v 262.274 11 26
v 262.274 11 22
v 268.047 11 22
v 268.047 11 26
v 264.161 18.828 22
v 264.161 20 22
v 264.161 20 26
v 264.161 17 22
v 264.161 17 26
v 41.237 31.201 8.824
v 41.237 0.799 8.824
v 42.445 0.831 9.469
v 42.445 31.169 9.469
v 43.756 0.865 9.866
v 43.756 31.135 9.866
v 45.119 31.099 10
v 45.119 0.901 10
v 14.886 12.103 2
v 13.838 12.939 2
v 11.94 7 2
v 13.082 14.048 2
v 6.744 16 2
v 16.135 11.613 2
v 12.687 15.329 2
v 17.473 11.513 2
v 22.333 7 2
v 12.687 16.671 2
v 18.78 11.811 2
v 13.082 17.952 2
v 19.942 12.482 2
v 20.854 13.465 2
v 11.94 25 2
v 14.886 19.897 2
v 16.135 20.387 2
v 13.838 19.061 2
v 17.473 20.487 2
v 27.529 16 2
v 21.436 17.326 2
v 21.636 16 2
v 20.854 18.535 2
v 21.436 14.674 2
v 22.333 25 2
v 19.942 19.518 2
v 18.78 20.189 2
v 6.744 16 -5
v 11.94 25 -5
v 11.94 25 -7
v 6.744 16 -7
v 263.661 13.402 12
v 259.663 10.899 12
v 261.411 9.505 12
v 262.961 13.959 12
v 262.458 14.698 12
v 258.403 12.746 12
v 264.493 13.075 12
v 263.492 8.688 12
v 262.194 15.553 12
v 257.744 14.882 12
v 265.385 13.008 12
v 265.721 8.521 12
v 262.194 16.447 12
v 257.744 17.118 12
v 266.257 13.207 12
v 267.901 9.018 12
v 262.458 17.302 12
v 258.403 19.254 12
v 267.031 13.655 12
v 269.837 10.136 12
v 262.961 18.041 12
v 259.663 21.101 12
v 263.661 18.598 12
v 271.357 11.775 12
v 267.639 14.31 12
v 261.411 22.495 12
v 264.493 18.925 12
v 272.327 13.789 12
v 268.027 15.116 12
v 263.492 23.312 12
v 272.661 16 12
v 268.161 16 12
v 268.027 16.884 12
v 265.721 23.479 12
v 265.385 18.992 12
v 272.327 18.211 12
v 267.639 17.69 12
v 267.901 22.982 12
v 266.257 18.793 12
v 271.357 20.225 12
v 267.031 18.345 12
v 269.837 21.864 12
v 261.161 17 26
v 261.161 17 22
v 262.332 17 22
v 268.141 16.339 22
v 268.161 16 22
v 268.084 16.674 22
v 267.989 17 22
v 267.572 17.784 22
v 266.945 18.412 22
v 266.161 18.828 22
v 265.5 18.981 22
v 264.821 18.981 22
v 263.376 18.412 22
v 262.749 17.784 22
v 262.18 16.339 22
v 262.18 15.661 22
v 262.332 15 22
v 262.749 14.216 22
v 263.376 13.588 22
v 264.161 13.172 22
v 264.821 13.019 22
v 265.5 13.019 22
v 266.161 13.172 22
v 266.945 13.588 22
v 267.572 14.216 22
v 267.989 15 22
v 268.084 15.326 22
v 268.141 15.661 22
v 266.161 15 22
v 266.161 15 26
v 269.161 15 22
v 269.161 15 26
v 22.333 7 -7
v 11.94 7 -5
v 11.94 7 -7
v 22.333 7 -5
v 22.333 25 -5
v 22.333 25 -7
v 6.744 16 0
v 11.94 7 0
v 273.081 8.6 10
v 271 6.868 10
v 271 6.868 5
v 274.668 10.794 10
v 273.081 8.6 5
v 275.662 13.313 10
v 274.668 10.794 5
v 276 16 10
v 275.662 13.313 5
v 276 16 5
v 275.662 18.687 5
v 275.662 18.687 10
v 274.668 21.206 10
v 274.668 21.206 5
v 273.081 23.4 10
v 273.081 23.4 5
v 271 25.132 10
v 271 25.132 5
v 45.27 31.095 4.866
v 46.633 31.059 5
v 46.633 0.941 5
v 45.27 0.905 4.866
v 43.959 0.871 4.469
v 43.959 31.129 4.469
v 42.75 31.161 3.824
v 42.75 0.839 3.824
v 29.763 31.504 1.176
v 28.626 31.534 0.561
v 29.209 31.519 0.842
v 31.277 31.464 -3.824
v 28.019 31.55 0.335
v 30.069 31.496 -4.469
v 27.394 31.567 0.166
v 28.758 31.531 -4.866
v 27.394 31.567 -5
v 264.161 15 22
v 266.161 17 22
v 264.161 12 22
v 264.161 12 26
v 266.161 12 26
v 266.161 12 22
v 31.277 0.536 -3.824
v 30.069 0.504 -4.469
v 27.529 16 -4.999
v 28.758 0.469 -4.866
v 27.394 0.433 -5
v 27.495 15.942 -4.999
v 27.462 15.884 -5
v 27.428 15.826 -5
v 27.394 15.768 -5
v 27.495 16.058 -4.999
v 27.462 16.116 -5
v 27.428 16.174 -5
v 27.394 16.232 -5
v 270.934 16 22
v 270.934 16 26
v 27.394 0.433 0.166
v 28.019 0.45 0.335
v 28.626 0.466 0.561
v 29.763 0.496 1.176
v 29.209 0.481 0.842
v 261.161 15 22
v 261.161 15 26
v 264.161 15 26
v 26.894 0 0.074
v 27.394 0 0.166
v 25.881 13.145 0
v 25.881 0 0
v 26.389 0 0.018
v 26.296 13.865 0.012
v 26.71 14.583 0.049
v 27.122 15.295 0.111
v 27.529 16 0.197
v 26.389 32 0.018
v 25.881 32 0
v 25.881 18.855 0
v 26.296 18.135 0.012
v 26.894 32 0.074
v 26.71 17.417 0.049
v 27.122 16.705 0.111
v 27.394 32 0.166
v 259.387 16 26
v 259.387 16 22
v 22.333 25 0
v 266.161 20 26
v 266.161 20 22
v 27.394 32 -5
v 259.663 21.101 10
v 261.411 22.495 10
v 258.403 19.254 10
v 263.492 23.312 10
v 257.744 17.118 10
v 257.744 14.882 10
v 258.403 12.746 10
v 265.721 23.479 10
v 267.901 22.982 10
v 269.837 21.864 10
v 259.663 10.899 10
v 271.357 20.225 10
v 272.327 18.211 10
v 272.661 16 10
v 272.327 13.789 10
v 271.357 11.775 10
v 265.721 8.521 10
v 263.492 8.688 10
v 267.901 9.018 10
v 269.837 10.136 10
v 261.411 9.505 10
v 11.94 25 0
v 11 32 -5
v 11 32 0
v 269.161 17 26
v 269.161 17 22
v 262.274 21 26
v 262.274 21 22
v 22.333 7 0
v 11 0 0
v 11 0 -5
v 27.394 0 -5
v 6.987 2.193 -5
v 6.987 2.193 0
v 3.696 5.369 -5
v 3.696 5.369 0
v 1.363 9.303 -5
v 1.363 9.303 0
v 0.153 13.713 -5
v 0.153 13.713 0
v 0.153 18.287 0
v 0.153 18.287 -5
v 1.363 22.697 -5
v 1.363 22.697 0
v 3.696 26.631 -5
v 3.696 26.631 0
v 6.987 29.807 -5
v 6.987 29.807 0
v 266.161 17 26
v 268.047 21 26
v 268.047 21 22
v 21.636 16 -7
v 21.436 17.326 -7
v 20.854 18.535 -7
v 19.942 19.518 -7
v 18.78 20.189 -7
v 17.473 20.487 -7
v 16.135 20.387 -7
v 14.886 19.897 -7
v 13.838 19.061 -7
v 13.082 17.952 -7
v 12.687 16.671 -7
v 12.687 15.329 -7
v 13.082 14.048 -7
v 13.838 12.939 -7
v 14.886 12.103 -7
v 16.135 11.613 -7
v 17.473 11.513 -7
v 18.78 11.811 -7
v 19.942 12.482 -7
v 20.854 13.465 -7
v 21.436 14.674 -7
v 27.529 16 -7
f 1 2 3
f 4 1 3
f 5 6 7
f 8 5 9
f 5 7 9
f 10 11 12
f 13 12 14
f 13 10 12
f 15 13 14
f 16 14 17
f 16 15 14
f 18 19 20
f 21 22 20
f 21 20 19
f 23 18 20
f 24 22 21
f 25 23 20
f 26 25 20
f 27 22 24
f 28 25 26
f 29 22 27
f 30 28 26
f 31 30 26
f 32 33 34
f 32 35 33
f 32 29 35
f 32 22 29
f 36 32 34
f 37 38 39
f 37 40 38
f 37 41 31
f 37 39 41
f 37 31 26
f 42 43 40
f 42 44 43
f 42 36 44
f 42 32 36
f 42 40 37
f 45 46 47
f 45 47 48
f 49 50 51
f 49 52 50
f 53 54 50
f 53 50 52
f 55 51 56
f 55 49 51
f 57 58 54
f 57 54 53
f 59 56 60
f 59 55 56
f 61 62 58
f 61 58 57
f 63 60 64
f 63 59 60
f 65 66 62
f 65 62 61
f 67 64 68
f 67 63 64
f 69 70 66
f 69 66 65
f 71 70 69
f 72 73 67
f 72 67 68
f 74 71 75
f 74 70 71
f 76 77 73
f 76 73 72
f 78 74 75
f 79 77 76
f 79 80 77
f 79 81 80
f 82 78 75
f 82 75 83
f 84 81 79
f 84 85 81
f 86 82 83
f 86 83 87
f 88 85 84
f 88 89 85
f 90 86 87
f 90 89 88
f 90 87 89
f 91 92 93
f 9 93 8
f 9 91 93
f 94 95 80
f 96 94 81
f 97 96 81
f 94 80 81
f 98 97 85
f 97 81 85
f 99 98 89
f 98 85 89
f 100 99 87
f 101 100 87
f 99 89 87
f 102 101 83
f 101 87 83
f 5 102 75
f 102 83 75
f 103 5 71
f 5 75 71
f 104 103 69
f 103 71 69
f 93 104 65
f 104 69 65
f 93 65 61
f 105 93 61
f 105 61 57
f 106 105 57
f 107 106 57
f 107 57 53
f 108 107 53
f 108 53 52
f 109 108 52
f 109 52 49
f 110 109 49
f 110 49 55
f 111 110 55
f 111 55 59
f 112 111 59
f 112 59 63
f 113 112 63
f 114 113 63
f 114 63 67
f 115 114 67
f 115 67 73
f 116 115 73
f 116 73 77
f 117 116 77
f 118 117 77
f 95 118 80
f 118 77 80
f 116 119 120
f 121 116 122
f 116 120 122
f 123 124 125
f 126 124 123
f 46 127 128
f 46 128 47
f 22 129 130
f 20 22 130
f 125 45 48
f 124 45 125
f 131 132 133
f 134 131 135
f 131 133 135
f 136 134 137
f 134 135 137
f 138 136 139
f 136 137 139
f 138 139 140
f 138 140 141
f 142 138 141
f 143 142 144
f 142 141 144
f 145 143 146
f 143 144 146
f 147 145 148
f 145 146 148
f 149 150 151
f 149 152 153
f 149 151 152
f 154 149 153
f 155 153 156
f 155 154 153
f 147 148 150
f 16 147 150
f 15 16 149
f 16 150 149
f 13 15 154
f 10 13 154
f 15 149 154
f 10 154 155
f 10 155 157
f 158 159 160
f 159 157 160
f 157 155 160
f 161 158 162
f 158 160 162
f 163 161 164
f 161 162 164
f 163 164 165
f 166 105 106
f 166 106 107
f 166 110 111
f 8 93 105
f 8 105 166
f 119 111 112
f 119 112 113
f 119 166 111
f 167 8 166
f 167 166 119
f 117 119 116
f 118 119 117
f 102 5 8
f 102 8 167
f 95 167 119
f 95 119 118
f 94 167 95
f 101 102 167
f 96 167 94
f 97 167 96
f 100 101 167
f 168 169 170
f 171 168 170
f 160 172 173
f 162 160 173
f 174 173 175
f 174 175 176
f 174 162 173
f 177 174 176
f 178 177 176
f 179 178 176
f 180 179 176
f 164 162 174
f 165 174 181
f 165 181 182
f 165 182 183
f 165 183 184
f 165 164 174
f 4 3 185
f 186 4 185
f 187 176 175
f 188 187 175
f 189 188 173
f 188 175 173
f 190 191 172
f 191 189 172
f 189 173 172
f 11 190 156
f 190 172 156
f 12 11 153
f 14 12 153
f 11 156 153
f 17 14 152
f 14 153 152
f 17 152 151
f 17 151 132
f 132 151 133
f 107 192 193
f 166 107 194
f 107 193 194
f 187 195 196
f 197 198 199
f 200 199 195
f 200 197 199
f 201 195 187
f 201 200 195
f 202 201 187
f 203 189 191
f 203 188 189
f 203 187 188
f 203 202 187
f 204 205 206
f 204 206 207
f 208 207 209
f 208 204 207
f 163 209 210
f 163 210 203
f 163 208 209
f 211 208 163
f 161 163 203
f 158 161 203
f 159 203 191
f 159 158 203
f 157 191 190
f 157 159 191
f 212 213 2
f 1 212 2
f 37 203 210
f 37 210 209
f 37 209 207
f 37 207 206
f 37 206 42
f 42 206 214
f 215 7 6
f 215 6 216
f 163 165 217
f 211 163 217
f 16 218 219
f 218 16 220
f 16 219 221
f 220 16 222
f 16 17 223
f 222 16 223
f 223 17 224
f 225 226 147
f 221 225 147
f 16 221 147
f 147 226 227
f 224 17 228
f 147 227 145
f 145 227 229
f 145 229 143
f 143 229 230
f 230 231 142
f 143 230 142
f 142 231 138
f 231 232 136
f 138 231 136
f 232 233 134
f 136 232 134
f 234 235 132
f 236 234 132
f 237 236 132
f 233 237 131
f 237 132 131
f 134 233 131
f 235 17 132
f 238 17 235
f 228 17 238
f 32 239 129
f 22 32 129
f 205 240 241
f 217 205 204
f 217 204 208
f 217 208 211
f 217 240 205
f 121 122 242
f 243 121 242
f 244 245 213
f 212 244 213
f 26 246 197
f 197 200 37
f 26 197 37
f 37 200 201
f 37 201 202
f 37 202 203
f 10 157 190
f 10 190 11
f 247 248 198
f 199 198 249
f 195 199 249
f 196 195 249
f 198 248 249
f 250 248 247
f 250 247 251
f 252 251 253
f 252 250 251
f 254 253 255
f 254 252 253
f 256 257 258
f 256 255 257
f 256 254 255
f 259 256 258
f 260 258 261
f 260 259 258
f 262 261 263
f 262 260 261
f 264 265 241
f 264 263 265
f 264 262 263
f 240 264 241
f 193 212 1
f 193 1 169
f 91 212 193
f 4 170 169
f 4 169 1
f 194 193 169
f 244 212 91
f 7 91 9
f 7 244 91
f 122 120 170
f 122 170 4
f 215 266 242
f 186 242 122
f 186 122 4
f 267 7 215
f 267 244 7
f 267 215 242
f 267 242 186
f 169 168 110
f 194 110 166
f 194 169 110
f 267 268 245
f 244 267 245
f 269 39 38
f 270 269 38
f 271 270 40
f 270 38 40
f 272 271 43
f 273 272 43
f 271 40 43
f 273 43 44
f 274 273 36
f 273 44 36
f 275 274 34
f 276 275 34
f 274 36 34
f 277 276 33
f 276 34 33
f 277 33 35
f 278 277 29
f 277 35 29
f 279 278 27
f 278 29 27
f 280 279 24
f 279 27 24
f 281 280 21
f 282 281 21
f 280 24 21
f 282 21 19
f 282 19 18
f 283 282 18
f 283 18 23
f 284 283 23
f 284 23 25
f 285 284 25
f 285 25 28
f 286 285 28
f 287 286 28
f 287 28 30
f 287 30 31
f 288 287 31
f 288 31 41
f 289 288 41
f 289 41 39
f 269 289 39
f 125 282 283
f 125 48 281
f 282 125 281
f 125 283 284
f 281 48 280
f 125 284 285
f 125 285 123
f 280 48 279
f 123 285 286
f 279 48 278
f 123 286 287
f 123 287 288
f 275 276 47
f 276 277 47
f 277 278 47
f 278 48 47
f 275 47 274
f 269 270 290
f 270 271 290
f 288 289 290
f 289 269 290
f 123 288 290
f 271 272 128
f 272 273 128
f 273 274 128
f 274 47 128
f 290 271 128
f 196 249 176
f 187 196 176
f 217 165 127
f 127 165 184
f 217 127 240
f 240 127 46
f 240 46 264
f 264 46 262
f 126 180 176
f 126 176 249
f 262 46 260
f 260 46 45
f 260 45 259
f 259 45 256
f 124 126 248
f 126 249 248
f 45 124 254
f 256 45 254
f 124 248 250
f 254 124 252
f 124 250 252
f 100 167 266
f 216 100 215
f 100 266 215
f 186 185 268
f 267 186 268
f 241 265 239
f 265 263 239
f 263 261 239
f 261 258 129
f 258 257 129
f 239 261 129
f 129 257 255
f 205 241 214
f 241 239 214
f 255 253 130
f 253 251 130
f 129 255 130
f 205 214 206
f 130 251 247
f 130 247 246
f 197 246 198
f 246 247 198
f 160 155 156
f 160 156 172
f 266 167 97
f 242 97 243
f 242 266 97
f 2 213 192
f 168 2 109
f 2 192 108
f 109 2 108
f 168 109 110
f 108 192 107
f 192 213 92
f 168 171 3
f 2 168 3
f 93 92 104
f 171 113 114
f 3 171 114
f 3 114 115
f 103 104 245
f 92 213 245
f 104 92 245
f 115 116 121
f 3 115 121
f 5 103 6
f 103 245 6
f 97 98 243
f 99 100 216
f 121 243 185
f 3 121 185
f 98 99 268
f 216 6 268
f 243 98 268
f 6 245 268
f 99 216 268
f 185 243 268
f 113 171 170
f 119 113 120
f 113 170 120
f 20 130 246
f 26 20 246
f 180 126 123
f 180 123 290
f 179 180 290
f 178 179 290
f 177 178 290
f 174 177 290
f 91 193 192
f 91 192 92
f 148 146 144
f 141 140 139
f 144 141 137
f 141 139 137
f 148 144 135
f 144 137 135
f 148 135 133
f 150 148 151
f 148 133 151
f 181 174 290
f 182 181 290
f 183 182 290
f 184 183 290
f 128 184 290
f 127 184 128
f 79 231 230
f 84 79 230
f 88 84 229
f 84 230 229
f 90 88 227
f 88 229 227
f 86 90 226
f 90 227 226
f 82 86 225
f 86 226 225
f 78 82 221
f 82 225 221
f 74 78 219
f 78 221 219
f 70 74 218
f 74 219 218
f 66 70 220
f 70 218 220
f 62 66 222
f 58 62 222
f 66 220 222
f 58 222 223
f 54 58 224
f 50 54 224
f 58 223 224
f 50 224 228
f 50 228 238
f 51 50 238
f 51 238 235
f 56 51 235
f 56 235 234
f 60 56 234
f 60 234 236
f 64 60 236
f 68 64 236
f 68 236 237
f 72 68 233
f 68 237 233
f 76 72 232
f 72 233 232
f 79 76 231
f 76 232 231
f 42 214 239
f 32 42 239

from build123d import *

# Parameters (mm, degrees)
BOSS_EXTRUDE1_DEPTH = 32
FILLET1_R           = 7
CUT_EXTRUDE1_DEPTH  = 32
CUT_EXTRUDE2_DEPTH  = 32
CUT_EXTRUDE3_DEPTH  = 32
SKETCH7_R           = 3
BOSS_EXTRUDE2_DEPTH = 12
BOSS_EXTRUDE3_DEPTH = 4
SKETCH9_W           = 3
SKETCH9_H           = 2
SKETCH9_W_2         = 2
SKETCH9_H_2         = 3
CUT_EXTRUDE4_DEPTH  = 4
SKETCH10_R          = 7.5
BOSS_EXTRUDE4_DEPTH = 2
BOSS_EXTRUDE5_DEPTH = 2
BOSS_EXTRUDE6_DEPTH = 9
SKETCH17_R          = 4.5
CUT_EXTRUDE5_DEPTH  = 10


with BuildPart() as part:
    # Sketch1 → Boss-Extrude1 (new body)
    with BuildSketch(Plane(origin=(0, 0, 0), x_dir=(1, 0, 0), z_dir=(0, 1, 0))):
        Polygon((0, 0), (28, 0), (43, -10), (276, -10), (276, -5), (44.513878189, -5), (29.513878189, 5), (0, 5), align=None)
    extrude(amount=BOSS_EXTRUDE1_DEPTH)

    # Fillet1
    fillet1_edges = [part.edges().sort_by_distance(p)[0] for p in [
        (29.513878189, 16, -5),
        (44.513878189, 16, 5),
        (43, 16, 10),
        (28, 16, 0),
    ]]
    fillet(fillet1_edges, radius=FILLET1_R)

    # Sketch4 → Cut-Extrude1 (cut)
    with BuildSketch(Plane(origin=(0, 0, -5), x_dir=(-1, 0, 0), z_dir=(0, 0, -1))):
        with BuildLine():
            Line((-11, 32), (12.683379318, 39.348401976))
            Line((12.683379318, 39.348401976), (11.560507562, -17.356621714))
            Line((11.560507562, -17.356621714), (-11, 0))
            ThreePointArc((-11, 0), (0, 16), (-11, 32))
        make_face()
    extrude(amount=-CUT_EXTRUDE1_DEPTH, mode=Mode.SUBTRACT)

    # Sketch5 → Cut-Extrude2 (cut)
    with BuildSketch(Plane(origin=(0, 0, -5), x_dir=(-1, 0, 0), z_dir=(0, 0, -1))):
        Polygon((-276, 25), (-27.394448725, 31.56693909), (-27.394448725, 32), (-276, 32), align=None)
        Polygon((-27.394448725, 0), (-27.394448725, 0.43306091), (-276, 7), (-276, 0), align=None)
    extrude(amount=-CUT_EXTRUDE2_DEPTH, mode=Mode.SUBTRACT)

    # Sketch6 → Cut-Extrude3 (cut)
    with BuildSketch(Plane(origin=(0, 0, 5), x_dir=(-1, 0, 0), z_dir=(0, 0, -1))):
        with BuildLine():
            ThreePointArc((-276, 16.000000308), (-274.6681814, 21.205641364), (-271, 25.132075472))
            Line((-271, 25.132075472), (-276, 25))
            Line((-276, 25), (-276, 16.000000308))
        make_face()
        with BuildLine():
            ThreePointArc((-271, 6.867924528), (-274.668181548, 10.794358906), (-276, 16.000000308))
            Line((-276, 16.000000308), (-276, 7))
            Line((-276, 7), (-271, 6.867924528))
        make_face()
    extrude(amount=-CUT_EXTRUDE3_DEPTH, mode=Mode.SUBTRACT)

    # Sketch7 → Boss-Extrude2 (add)
    with BuildSketch(Plane.XY.offset(10)):
        with Locations((265.160519758, 16)):
            Circle(SKETCH7_R)
    extrude(amount=BOSS_EXTRUDE2_DEPTH)

    # Sketch8 → Boss-Extrude3 (add)
    with BuildSketch(Plane.XY.offset(22)):
        Polygon((270.93402245, 16), (268.047271104, 21), (262.273768412, 21), (259.387017066, 16), (262.273768412, 11), (268.047271104, 11), align=None)
    extrude(amount=BOSS_EXTRUDE3_DEPTH)

    # Sketch9 → Cut-Extrude4 (cut)
    with BuildSketch(Plane.XY.offset(26)):
        with Locations((267.660519758, 16)):
            Rectangle(SKETCH9_W, SKETCH9_H)
        with Locations((265.160519758, 18.5)):
            Rectangle(SKETCH9_W_2, SKETCH9_H_2)
        with Locations((265.160519758, 16)):
            Rectangle(SKETCH9_W_2, SKETCH9_H)
        with Locations((262.660519758, 16)):
            Rectangle(SKETCH9_W, SKETCH9_H)
        with Locations((265.160519758, 13.5)):
            Rectangle(SKETCH9_W_2, SKETCH9_H_2)
    extrude(amount=-CUT_EXTRUDE4_DEPTH, mode=Mode.SUBTRACT)

    # Sketch10 → Boss-Extrude4 (add)
    with BuildSketch(Plane.XY.offset(10)):
        with Locations((265.160519758, 16)):
            Circle(SKETCH10_R)
    extrude(amount=BOSS_EXTRUDE4_DEPTH)

    # Sketch11 → Boss-Extrude5 (add)
    with BuildSketch(Plane.XY):
        Polygon((27.528668482, 16), (22.332516059, 25), (11.940211214, 25), (6.744058791, 16), (11.940211214, 7), (22.332516059, 7), align=None)
    extrude(amount=BOSS_EXTRUDE5_DEPTH)

    # Sketch12 → Boss-Extrude6 (add)
    with BuildSketch(Plane.XY.offset(2)):
        Polygon((22.332516059, 7), (27.528668482, 16), (22.332516059, 25), (11.940211214, 25), (6.744058791, 16), (11.940211214, 7), align=None)
    extrude(amount=-BOSS_EXTRUDE6_DEPTH)

    # Sketch17 → Cut-Extrude5 (cut)
    with BuildSketch(Plane.XY.offset(2)):
        with Locations((17.136363636, 16)):
            Circle(SKETCH17_R)
    extrude(amount=-CUT_EXTRUDE5_DEPTH, mode=Mode.SUBTRACT)


solid = part.part
